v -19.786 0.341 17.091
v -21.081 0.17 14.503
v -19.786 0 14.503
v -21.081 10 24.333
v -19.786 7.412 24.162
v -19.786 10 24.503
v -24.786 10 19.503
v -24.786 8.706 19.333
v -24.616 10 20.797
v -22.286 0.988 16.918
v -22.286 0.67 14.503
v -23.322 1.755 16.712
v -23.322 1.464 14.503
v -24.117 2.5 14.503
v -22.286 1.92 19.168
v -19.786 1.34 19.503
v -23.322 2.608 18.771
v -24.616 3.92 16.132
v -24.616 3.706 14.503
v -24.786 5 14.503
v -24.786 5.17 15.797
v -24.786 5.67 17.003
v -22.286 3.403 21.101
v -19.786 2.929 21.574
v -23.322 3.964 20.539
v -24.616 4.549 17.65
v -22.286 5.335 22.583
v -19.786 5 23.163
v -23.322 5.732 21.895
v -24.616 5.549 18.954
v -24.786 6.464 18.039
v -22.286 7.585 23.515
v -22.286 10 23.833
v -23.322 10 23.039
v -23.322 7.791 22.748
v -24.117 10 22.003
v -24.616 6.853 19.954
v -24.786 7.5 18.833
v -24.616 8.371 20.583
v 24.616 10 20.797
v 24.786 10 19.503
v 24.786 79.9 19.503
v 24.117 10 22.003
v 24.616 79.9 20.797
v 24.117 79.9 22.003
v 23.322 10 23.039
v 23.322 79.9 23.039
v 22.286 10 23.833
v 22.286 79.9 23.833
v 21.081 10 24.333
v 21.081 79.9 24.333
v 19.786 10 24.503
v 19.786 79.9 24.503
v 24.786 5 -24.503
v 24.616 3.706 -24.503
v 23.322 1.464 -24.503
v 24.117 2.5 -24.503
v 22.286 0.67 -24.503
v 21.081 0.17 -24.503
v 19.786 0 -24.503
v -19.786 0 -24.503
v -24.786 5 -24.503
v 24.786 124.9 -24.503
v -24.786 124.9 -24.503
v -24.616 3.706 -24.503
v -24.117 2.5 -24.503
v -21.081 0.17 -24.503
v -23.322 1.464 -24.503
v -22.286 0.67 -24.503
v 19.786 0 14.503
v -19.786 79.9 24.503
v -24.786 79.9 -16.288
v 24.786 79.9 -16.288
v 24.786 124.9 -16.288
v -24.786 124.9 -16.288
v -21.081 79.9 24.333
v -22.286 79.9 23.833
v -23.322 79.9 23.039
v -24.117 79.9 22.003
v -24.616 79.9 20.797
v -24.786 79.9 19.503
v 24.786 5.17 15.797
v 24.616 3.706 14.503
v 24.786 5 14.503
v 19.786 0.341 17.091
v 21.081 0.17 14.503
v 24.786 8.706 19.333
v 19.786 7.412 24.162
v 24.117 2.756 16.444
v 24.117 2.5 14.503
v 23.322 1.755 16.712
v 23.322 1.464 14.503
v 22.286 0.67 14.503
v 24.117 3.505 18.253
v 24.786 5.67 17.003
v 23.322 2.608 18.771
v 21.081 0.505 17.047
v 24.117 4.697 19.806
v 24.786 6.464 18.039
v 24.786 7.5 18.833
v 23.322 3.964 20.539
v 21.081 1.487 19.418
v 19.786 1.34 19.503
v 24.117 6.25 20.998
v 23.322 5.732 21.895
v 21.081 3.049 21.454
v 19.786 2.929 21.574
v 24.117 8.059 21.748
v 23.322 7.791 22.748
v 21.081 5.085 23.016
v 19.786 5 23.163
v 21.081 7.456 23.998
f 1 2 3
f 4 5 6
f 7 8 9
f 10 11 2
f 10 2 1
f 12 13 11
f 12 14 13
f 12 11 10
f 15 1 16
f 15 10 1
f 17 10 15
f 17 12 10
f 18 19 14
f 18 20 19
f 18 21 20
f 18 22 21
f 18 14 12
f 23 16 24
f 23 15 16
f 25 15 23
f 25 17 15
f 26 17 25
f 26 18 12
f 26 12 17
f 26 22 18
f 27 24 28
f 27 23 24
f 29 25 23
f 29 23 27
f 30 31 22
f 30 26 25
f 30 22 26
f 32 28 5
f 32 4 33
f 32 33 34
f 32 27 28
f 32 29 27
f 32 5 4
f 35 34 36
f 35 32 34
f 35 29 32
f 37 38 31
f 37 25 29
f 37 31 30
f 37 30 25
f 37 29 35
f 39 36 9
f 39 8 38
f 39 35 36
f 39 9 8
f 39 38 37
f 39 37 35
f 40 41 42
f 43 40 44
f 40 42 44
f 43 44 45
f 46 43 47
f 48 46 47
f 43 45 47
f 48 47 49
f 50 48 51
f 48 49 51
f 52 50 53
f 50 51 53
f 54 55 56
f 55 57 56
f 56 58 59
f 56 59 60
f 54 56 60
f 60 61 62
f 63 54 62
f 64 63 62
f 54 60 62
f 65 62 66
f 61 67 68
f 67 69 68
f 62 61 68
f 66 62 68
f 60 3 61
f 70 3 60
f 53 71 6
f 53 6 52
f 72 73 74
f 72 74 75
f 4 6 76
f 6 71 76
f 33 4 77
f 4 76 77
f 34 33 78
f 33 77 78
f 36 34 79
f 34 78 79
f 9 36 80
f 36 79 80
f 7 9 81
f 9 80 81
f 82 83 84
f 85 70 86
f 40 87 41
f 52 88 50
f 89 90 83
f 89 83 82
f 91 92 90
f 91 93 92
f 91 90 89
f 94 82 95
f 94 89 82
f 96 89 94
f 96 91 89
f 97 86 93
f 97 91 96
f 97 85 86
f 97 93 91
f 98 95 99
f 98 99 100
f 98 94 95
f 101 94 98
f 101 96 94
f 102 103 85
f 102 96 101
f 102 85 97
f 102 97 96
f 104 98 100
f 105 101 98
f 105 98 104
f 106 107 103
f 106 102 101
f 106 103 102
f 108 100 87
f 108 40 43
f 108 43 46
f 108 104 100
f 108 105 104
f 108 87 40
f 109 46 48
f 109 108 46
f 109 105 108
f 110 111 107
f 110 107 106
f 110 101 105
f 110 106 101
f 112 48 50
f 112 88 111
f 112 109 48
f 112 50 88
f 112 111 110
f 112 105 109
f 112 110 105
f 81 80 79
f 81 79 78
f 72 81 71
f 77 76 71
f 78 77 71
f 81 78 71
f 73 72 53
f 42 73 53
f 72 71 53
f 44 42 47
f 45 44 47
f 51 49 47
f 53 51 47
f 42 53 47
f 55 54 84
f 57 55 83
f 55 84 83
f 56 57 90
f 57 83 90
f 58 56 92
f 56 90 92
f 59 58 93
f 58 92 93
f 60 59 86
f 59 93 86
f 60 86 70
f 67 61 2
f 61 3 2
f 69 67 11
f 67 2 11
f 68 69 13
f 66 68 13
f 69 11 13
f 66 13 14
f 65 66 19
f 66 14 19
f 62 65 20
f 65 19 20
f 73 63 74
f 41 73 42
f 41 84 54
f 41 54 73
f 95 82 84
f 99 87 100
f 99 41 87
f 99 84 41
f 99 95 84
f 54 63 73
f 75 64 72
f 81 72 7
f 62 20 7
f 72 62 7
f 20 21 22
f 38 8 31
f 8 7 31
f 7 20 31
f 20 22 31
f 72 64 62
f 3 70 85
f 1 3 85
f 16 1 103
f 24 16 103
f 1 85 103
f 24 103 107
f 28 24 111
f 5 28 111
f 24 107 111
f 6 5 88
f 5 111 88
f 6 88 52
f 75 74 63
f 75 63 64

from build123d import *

# Parameters (mm, degrees)
F0_W     = 49.5728366077
F0_H     = 49.0062981844
F1_DEPTH = 79.9
F2_W     = 49.5728366077
F2_H     = 8.2149282098
F3_DEPTH = 45
F4_R     = 10
F5_R     = 5


with BuildPart() as f1:
    # F0 (on Front) → F1 (new body)
    with BuildSketch(Plane.XZ):
        Rectangle(F0_W, F0_H)
    extrude(amount=-F1_DEPTH)

    # F2 (on face) → F3 (join)
    with BuildSketch(Plane(origin=(0, 79.9, 0), x_dir=(-1, 0, 0), z_dir=(0, 1, 0))):
        with Locations((0, -20.3956849873)):
            Rectangle(F2_W, F2_H)
    extrude(amount=F3_DEPTH)

    # F4
    f4_edges = [f1.edges().sort_by_distance(p)[0] for p in [
        (0, 0, 24.503149),
    ]]
    fillet(f4_edges, radius=F4_R)

    # F5
    f5_edges = [f1.edges().sort_by_distance(p)[0] for p in [
        (24.786418, 2.928932, 21.574217),
        (-24.786418, 2.928932, 21.574217),
    ]]
    fillet(f5_edges, radius=F5_R)


solid = f1.part
